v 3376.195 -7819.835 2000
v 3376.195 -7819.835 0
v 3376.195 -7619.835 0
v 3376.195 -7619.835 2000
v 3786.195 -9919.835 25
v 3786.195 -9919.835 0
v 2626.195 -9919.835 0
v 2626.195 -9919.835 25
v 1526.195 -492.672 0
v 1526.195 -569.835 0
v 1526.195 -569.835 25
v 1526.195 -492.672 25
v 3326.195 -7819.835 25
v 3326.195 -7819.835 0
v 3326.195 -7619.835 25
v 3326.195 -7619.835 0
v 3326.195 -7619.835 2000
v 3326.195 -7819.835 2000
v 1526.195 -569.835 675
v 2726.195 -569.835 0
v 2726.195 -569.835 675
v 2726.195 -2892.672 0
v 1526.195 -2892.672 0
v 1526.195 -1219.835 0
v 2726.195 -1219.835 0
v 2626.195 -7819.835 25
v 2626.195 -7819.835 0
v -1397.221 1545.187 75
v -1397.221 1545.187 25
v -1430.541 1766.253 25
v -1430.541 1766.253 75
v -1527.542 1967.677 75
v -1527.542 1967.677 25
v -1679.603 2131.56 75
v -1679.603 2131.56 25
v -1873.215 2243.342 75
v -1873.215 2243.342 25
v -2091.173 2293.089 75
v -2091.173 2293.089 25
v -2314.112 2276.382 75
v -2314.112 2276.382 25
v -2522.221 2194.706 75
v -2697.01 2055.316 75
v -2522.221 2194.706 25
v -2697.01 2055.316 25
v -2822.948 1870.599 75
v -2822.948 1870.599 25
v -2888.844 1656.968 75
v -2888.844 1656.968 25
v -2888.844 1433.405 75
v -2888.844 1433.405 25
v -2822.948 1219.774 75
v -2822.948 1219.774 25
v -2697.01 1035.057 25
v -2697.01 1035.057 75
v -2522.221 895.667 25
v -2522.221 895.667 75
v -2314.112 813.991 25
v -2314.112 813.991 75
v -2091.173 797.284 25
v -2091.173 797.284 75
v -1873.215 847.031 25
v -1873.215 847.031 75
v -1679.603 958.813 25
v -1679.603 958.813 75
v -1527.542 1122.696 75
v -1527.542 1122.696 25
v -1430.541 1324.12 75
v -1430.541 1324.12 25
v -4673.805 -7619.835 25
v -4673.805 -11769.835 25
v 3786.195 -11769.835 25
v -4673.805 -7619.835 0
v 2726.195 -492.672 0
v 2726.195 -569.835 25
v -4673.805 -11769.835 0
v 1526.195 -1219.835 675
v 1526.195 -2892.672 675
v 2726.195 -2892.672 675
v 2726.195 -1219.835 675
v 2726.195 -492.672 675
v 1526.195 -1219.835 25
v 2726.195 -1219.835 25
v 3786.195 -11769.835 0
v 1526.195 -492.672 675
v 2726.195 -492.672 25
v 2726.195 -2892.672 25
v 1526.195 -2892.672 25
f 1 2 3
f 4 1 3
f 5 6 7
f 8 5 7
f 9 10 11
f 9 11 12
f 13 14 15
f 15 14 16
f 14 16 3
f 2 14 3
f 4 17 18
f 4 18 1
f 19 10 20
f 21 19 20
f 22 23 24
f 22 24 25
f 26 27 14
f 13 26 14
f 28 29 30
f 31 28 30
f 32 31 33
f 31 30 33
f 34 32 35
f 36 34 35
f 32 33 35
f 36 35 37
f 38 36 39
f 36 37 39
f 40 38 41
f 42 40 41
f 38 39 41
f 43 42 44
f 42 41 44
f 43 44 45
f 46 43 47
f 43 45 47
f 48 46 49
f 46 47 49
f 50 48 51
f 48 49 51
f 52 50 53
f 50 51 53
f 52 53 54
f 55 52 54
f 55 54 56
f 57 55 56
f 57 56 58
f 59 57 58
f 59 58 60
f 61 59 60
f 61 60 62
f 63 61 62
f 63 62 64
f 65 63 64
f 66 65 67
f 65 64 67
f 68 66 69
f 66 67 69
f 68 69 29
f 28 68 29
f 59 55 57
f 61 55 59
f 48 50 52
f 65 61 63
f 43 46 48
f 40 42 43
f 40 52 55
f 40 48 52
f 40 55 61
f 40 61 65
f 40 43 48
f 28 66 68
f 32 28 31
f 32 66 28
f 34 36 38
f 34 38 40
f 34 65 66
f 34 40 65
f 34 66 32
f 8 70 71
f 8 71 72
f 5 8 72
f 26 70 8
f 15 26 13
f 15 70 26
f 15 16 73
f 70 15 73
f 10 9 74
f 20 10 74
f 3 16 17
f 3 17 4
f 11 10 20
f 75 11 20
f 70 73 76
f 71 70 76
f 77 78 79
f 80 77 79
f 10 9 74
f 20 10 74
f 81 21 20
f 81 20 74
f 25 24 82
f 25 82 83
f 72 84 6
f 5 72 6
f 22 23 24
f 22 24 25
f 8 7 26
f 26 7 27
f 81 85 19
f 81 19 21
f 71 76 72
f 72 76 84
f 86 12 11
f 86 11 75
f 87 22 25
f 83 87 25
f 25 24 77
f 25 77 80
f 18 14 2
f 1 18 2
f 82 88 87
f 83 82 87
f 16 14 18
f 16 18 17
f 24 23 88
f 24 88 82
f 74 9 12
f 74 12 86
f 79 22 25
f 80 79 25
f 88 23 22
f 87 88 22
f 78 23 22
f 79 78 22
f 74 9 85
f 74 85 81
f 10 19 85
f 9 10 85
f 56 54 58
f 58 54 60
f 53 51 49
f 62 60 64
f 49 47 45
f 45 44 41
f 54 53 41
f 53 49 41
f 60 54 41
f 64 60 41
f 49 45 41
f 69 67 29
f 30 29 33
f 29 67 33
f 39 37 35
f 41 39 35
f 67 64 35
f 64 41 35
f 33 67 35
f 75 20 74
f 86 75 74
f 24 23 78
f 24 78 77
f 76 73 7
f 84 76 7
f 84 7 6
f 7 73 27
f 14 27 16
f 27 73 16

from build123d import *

# Parameters (mm, degrees)
F0_W     = 1200
F0_H     = 77.1629333496
F1_DEPTH = 25
F0_H_2   = 1672.8370666504
F2_DEPTH = 675
F0_W_2   = 50
F0_H_3   = 200
F3_DEPTH = 2000
F4_R     = 750
F5_DEPTH = 50


with BuildPart() as f1:
    # F0 (on Top) → F1 (new body)
    with BuildSketch(Plane.XY):
        with Locations((2126.1950492859, -531.2530517578)):
            Rectangle(F0_W, F0_H)
    extrude(amount=F1_DEPTH)


with BuildPart() as f1b:
    # F0 (on Top) → F1, piece 2 (new body)
    with BuildSketch(Plane.XY):
        with Locations((2126.1950492859, -2056.2530517578)):
            Rectangle(F0_W, F0_H_2)
    extrude(amount=F1_DEPTH)


with BuildPart() as f1c:
    # F0 (on Top) → F1, piece 3 (new body)
    with BuildSketch(Plane.XY):
        Polygon((-2573.8049507141, -11769.8345184326), (3786.1950492859, -11769.8345184326), (3786.1950492859, -9919.8345184326), (2626.1950492859, -9919.8345184326), (2626.1950492859, -7819.8345184326), (3326.1950492859, -7819.8345184326), (3326.1950492859, -7619.8345184326), (-4673.8049507141, -7619.8345184326), (-4673.8049507141, -11769.8345184326), align=None)
    extrude(amount=F1_DEPTH)


with BuildPart() as f2:
    # F0 (on Top) → F2 (new body)
    with BuildSketch(Plane.XY):
        with Locations((2126.1950492859, -2056.2530517578)):
            Rectangle(F0_W, F0_H_2)
    extrude(amount=F2_DEPTH)


with BuildPart() as f2b:
    # F0 (on Top) → F2, piece 2 (new body)
    with BuildSketch(Plane.XY):
        with Locations((2126.1950492859, -531.2530517578)):
            Rectangle(F0_W, F0_H)
    extrude(amount=F2_DEPTH)


with BuildPart() as f3:
    # F0 (on Top) → F3 (new body)
    with BuildSketch(Plane.XY):
        with Locations((3351.1950492859, -7719.8345184326)):
            Rectangle(F0_W_2, F0_H_3)
    extrude(amount=F3_DEPTH)


with BuildPart() as f5:
    # F4 (on face) → F5 (new body)
    with BuildSketch(Plane.XY.offset(25)):
        with Locations((-2147.2208499908, 1545.1865196228)):
            Circle(F4_R)
    extrude(amount=F5_DEPTH)


solid = Compound([f1.part, f1b.part, f1c.part, f2.part, f2b.part, f3.part, f5.part])
